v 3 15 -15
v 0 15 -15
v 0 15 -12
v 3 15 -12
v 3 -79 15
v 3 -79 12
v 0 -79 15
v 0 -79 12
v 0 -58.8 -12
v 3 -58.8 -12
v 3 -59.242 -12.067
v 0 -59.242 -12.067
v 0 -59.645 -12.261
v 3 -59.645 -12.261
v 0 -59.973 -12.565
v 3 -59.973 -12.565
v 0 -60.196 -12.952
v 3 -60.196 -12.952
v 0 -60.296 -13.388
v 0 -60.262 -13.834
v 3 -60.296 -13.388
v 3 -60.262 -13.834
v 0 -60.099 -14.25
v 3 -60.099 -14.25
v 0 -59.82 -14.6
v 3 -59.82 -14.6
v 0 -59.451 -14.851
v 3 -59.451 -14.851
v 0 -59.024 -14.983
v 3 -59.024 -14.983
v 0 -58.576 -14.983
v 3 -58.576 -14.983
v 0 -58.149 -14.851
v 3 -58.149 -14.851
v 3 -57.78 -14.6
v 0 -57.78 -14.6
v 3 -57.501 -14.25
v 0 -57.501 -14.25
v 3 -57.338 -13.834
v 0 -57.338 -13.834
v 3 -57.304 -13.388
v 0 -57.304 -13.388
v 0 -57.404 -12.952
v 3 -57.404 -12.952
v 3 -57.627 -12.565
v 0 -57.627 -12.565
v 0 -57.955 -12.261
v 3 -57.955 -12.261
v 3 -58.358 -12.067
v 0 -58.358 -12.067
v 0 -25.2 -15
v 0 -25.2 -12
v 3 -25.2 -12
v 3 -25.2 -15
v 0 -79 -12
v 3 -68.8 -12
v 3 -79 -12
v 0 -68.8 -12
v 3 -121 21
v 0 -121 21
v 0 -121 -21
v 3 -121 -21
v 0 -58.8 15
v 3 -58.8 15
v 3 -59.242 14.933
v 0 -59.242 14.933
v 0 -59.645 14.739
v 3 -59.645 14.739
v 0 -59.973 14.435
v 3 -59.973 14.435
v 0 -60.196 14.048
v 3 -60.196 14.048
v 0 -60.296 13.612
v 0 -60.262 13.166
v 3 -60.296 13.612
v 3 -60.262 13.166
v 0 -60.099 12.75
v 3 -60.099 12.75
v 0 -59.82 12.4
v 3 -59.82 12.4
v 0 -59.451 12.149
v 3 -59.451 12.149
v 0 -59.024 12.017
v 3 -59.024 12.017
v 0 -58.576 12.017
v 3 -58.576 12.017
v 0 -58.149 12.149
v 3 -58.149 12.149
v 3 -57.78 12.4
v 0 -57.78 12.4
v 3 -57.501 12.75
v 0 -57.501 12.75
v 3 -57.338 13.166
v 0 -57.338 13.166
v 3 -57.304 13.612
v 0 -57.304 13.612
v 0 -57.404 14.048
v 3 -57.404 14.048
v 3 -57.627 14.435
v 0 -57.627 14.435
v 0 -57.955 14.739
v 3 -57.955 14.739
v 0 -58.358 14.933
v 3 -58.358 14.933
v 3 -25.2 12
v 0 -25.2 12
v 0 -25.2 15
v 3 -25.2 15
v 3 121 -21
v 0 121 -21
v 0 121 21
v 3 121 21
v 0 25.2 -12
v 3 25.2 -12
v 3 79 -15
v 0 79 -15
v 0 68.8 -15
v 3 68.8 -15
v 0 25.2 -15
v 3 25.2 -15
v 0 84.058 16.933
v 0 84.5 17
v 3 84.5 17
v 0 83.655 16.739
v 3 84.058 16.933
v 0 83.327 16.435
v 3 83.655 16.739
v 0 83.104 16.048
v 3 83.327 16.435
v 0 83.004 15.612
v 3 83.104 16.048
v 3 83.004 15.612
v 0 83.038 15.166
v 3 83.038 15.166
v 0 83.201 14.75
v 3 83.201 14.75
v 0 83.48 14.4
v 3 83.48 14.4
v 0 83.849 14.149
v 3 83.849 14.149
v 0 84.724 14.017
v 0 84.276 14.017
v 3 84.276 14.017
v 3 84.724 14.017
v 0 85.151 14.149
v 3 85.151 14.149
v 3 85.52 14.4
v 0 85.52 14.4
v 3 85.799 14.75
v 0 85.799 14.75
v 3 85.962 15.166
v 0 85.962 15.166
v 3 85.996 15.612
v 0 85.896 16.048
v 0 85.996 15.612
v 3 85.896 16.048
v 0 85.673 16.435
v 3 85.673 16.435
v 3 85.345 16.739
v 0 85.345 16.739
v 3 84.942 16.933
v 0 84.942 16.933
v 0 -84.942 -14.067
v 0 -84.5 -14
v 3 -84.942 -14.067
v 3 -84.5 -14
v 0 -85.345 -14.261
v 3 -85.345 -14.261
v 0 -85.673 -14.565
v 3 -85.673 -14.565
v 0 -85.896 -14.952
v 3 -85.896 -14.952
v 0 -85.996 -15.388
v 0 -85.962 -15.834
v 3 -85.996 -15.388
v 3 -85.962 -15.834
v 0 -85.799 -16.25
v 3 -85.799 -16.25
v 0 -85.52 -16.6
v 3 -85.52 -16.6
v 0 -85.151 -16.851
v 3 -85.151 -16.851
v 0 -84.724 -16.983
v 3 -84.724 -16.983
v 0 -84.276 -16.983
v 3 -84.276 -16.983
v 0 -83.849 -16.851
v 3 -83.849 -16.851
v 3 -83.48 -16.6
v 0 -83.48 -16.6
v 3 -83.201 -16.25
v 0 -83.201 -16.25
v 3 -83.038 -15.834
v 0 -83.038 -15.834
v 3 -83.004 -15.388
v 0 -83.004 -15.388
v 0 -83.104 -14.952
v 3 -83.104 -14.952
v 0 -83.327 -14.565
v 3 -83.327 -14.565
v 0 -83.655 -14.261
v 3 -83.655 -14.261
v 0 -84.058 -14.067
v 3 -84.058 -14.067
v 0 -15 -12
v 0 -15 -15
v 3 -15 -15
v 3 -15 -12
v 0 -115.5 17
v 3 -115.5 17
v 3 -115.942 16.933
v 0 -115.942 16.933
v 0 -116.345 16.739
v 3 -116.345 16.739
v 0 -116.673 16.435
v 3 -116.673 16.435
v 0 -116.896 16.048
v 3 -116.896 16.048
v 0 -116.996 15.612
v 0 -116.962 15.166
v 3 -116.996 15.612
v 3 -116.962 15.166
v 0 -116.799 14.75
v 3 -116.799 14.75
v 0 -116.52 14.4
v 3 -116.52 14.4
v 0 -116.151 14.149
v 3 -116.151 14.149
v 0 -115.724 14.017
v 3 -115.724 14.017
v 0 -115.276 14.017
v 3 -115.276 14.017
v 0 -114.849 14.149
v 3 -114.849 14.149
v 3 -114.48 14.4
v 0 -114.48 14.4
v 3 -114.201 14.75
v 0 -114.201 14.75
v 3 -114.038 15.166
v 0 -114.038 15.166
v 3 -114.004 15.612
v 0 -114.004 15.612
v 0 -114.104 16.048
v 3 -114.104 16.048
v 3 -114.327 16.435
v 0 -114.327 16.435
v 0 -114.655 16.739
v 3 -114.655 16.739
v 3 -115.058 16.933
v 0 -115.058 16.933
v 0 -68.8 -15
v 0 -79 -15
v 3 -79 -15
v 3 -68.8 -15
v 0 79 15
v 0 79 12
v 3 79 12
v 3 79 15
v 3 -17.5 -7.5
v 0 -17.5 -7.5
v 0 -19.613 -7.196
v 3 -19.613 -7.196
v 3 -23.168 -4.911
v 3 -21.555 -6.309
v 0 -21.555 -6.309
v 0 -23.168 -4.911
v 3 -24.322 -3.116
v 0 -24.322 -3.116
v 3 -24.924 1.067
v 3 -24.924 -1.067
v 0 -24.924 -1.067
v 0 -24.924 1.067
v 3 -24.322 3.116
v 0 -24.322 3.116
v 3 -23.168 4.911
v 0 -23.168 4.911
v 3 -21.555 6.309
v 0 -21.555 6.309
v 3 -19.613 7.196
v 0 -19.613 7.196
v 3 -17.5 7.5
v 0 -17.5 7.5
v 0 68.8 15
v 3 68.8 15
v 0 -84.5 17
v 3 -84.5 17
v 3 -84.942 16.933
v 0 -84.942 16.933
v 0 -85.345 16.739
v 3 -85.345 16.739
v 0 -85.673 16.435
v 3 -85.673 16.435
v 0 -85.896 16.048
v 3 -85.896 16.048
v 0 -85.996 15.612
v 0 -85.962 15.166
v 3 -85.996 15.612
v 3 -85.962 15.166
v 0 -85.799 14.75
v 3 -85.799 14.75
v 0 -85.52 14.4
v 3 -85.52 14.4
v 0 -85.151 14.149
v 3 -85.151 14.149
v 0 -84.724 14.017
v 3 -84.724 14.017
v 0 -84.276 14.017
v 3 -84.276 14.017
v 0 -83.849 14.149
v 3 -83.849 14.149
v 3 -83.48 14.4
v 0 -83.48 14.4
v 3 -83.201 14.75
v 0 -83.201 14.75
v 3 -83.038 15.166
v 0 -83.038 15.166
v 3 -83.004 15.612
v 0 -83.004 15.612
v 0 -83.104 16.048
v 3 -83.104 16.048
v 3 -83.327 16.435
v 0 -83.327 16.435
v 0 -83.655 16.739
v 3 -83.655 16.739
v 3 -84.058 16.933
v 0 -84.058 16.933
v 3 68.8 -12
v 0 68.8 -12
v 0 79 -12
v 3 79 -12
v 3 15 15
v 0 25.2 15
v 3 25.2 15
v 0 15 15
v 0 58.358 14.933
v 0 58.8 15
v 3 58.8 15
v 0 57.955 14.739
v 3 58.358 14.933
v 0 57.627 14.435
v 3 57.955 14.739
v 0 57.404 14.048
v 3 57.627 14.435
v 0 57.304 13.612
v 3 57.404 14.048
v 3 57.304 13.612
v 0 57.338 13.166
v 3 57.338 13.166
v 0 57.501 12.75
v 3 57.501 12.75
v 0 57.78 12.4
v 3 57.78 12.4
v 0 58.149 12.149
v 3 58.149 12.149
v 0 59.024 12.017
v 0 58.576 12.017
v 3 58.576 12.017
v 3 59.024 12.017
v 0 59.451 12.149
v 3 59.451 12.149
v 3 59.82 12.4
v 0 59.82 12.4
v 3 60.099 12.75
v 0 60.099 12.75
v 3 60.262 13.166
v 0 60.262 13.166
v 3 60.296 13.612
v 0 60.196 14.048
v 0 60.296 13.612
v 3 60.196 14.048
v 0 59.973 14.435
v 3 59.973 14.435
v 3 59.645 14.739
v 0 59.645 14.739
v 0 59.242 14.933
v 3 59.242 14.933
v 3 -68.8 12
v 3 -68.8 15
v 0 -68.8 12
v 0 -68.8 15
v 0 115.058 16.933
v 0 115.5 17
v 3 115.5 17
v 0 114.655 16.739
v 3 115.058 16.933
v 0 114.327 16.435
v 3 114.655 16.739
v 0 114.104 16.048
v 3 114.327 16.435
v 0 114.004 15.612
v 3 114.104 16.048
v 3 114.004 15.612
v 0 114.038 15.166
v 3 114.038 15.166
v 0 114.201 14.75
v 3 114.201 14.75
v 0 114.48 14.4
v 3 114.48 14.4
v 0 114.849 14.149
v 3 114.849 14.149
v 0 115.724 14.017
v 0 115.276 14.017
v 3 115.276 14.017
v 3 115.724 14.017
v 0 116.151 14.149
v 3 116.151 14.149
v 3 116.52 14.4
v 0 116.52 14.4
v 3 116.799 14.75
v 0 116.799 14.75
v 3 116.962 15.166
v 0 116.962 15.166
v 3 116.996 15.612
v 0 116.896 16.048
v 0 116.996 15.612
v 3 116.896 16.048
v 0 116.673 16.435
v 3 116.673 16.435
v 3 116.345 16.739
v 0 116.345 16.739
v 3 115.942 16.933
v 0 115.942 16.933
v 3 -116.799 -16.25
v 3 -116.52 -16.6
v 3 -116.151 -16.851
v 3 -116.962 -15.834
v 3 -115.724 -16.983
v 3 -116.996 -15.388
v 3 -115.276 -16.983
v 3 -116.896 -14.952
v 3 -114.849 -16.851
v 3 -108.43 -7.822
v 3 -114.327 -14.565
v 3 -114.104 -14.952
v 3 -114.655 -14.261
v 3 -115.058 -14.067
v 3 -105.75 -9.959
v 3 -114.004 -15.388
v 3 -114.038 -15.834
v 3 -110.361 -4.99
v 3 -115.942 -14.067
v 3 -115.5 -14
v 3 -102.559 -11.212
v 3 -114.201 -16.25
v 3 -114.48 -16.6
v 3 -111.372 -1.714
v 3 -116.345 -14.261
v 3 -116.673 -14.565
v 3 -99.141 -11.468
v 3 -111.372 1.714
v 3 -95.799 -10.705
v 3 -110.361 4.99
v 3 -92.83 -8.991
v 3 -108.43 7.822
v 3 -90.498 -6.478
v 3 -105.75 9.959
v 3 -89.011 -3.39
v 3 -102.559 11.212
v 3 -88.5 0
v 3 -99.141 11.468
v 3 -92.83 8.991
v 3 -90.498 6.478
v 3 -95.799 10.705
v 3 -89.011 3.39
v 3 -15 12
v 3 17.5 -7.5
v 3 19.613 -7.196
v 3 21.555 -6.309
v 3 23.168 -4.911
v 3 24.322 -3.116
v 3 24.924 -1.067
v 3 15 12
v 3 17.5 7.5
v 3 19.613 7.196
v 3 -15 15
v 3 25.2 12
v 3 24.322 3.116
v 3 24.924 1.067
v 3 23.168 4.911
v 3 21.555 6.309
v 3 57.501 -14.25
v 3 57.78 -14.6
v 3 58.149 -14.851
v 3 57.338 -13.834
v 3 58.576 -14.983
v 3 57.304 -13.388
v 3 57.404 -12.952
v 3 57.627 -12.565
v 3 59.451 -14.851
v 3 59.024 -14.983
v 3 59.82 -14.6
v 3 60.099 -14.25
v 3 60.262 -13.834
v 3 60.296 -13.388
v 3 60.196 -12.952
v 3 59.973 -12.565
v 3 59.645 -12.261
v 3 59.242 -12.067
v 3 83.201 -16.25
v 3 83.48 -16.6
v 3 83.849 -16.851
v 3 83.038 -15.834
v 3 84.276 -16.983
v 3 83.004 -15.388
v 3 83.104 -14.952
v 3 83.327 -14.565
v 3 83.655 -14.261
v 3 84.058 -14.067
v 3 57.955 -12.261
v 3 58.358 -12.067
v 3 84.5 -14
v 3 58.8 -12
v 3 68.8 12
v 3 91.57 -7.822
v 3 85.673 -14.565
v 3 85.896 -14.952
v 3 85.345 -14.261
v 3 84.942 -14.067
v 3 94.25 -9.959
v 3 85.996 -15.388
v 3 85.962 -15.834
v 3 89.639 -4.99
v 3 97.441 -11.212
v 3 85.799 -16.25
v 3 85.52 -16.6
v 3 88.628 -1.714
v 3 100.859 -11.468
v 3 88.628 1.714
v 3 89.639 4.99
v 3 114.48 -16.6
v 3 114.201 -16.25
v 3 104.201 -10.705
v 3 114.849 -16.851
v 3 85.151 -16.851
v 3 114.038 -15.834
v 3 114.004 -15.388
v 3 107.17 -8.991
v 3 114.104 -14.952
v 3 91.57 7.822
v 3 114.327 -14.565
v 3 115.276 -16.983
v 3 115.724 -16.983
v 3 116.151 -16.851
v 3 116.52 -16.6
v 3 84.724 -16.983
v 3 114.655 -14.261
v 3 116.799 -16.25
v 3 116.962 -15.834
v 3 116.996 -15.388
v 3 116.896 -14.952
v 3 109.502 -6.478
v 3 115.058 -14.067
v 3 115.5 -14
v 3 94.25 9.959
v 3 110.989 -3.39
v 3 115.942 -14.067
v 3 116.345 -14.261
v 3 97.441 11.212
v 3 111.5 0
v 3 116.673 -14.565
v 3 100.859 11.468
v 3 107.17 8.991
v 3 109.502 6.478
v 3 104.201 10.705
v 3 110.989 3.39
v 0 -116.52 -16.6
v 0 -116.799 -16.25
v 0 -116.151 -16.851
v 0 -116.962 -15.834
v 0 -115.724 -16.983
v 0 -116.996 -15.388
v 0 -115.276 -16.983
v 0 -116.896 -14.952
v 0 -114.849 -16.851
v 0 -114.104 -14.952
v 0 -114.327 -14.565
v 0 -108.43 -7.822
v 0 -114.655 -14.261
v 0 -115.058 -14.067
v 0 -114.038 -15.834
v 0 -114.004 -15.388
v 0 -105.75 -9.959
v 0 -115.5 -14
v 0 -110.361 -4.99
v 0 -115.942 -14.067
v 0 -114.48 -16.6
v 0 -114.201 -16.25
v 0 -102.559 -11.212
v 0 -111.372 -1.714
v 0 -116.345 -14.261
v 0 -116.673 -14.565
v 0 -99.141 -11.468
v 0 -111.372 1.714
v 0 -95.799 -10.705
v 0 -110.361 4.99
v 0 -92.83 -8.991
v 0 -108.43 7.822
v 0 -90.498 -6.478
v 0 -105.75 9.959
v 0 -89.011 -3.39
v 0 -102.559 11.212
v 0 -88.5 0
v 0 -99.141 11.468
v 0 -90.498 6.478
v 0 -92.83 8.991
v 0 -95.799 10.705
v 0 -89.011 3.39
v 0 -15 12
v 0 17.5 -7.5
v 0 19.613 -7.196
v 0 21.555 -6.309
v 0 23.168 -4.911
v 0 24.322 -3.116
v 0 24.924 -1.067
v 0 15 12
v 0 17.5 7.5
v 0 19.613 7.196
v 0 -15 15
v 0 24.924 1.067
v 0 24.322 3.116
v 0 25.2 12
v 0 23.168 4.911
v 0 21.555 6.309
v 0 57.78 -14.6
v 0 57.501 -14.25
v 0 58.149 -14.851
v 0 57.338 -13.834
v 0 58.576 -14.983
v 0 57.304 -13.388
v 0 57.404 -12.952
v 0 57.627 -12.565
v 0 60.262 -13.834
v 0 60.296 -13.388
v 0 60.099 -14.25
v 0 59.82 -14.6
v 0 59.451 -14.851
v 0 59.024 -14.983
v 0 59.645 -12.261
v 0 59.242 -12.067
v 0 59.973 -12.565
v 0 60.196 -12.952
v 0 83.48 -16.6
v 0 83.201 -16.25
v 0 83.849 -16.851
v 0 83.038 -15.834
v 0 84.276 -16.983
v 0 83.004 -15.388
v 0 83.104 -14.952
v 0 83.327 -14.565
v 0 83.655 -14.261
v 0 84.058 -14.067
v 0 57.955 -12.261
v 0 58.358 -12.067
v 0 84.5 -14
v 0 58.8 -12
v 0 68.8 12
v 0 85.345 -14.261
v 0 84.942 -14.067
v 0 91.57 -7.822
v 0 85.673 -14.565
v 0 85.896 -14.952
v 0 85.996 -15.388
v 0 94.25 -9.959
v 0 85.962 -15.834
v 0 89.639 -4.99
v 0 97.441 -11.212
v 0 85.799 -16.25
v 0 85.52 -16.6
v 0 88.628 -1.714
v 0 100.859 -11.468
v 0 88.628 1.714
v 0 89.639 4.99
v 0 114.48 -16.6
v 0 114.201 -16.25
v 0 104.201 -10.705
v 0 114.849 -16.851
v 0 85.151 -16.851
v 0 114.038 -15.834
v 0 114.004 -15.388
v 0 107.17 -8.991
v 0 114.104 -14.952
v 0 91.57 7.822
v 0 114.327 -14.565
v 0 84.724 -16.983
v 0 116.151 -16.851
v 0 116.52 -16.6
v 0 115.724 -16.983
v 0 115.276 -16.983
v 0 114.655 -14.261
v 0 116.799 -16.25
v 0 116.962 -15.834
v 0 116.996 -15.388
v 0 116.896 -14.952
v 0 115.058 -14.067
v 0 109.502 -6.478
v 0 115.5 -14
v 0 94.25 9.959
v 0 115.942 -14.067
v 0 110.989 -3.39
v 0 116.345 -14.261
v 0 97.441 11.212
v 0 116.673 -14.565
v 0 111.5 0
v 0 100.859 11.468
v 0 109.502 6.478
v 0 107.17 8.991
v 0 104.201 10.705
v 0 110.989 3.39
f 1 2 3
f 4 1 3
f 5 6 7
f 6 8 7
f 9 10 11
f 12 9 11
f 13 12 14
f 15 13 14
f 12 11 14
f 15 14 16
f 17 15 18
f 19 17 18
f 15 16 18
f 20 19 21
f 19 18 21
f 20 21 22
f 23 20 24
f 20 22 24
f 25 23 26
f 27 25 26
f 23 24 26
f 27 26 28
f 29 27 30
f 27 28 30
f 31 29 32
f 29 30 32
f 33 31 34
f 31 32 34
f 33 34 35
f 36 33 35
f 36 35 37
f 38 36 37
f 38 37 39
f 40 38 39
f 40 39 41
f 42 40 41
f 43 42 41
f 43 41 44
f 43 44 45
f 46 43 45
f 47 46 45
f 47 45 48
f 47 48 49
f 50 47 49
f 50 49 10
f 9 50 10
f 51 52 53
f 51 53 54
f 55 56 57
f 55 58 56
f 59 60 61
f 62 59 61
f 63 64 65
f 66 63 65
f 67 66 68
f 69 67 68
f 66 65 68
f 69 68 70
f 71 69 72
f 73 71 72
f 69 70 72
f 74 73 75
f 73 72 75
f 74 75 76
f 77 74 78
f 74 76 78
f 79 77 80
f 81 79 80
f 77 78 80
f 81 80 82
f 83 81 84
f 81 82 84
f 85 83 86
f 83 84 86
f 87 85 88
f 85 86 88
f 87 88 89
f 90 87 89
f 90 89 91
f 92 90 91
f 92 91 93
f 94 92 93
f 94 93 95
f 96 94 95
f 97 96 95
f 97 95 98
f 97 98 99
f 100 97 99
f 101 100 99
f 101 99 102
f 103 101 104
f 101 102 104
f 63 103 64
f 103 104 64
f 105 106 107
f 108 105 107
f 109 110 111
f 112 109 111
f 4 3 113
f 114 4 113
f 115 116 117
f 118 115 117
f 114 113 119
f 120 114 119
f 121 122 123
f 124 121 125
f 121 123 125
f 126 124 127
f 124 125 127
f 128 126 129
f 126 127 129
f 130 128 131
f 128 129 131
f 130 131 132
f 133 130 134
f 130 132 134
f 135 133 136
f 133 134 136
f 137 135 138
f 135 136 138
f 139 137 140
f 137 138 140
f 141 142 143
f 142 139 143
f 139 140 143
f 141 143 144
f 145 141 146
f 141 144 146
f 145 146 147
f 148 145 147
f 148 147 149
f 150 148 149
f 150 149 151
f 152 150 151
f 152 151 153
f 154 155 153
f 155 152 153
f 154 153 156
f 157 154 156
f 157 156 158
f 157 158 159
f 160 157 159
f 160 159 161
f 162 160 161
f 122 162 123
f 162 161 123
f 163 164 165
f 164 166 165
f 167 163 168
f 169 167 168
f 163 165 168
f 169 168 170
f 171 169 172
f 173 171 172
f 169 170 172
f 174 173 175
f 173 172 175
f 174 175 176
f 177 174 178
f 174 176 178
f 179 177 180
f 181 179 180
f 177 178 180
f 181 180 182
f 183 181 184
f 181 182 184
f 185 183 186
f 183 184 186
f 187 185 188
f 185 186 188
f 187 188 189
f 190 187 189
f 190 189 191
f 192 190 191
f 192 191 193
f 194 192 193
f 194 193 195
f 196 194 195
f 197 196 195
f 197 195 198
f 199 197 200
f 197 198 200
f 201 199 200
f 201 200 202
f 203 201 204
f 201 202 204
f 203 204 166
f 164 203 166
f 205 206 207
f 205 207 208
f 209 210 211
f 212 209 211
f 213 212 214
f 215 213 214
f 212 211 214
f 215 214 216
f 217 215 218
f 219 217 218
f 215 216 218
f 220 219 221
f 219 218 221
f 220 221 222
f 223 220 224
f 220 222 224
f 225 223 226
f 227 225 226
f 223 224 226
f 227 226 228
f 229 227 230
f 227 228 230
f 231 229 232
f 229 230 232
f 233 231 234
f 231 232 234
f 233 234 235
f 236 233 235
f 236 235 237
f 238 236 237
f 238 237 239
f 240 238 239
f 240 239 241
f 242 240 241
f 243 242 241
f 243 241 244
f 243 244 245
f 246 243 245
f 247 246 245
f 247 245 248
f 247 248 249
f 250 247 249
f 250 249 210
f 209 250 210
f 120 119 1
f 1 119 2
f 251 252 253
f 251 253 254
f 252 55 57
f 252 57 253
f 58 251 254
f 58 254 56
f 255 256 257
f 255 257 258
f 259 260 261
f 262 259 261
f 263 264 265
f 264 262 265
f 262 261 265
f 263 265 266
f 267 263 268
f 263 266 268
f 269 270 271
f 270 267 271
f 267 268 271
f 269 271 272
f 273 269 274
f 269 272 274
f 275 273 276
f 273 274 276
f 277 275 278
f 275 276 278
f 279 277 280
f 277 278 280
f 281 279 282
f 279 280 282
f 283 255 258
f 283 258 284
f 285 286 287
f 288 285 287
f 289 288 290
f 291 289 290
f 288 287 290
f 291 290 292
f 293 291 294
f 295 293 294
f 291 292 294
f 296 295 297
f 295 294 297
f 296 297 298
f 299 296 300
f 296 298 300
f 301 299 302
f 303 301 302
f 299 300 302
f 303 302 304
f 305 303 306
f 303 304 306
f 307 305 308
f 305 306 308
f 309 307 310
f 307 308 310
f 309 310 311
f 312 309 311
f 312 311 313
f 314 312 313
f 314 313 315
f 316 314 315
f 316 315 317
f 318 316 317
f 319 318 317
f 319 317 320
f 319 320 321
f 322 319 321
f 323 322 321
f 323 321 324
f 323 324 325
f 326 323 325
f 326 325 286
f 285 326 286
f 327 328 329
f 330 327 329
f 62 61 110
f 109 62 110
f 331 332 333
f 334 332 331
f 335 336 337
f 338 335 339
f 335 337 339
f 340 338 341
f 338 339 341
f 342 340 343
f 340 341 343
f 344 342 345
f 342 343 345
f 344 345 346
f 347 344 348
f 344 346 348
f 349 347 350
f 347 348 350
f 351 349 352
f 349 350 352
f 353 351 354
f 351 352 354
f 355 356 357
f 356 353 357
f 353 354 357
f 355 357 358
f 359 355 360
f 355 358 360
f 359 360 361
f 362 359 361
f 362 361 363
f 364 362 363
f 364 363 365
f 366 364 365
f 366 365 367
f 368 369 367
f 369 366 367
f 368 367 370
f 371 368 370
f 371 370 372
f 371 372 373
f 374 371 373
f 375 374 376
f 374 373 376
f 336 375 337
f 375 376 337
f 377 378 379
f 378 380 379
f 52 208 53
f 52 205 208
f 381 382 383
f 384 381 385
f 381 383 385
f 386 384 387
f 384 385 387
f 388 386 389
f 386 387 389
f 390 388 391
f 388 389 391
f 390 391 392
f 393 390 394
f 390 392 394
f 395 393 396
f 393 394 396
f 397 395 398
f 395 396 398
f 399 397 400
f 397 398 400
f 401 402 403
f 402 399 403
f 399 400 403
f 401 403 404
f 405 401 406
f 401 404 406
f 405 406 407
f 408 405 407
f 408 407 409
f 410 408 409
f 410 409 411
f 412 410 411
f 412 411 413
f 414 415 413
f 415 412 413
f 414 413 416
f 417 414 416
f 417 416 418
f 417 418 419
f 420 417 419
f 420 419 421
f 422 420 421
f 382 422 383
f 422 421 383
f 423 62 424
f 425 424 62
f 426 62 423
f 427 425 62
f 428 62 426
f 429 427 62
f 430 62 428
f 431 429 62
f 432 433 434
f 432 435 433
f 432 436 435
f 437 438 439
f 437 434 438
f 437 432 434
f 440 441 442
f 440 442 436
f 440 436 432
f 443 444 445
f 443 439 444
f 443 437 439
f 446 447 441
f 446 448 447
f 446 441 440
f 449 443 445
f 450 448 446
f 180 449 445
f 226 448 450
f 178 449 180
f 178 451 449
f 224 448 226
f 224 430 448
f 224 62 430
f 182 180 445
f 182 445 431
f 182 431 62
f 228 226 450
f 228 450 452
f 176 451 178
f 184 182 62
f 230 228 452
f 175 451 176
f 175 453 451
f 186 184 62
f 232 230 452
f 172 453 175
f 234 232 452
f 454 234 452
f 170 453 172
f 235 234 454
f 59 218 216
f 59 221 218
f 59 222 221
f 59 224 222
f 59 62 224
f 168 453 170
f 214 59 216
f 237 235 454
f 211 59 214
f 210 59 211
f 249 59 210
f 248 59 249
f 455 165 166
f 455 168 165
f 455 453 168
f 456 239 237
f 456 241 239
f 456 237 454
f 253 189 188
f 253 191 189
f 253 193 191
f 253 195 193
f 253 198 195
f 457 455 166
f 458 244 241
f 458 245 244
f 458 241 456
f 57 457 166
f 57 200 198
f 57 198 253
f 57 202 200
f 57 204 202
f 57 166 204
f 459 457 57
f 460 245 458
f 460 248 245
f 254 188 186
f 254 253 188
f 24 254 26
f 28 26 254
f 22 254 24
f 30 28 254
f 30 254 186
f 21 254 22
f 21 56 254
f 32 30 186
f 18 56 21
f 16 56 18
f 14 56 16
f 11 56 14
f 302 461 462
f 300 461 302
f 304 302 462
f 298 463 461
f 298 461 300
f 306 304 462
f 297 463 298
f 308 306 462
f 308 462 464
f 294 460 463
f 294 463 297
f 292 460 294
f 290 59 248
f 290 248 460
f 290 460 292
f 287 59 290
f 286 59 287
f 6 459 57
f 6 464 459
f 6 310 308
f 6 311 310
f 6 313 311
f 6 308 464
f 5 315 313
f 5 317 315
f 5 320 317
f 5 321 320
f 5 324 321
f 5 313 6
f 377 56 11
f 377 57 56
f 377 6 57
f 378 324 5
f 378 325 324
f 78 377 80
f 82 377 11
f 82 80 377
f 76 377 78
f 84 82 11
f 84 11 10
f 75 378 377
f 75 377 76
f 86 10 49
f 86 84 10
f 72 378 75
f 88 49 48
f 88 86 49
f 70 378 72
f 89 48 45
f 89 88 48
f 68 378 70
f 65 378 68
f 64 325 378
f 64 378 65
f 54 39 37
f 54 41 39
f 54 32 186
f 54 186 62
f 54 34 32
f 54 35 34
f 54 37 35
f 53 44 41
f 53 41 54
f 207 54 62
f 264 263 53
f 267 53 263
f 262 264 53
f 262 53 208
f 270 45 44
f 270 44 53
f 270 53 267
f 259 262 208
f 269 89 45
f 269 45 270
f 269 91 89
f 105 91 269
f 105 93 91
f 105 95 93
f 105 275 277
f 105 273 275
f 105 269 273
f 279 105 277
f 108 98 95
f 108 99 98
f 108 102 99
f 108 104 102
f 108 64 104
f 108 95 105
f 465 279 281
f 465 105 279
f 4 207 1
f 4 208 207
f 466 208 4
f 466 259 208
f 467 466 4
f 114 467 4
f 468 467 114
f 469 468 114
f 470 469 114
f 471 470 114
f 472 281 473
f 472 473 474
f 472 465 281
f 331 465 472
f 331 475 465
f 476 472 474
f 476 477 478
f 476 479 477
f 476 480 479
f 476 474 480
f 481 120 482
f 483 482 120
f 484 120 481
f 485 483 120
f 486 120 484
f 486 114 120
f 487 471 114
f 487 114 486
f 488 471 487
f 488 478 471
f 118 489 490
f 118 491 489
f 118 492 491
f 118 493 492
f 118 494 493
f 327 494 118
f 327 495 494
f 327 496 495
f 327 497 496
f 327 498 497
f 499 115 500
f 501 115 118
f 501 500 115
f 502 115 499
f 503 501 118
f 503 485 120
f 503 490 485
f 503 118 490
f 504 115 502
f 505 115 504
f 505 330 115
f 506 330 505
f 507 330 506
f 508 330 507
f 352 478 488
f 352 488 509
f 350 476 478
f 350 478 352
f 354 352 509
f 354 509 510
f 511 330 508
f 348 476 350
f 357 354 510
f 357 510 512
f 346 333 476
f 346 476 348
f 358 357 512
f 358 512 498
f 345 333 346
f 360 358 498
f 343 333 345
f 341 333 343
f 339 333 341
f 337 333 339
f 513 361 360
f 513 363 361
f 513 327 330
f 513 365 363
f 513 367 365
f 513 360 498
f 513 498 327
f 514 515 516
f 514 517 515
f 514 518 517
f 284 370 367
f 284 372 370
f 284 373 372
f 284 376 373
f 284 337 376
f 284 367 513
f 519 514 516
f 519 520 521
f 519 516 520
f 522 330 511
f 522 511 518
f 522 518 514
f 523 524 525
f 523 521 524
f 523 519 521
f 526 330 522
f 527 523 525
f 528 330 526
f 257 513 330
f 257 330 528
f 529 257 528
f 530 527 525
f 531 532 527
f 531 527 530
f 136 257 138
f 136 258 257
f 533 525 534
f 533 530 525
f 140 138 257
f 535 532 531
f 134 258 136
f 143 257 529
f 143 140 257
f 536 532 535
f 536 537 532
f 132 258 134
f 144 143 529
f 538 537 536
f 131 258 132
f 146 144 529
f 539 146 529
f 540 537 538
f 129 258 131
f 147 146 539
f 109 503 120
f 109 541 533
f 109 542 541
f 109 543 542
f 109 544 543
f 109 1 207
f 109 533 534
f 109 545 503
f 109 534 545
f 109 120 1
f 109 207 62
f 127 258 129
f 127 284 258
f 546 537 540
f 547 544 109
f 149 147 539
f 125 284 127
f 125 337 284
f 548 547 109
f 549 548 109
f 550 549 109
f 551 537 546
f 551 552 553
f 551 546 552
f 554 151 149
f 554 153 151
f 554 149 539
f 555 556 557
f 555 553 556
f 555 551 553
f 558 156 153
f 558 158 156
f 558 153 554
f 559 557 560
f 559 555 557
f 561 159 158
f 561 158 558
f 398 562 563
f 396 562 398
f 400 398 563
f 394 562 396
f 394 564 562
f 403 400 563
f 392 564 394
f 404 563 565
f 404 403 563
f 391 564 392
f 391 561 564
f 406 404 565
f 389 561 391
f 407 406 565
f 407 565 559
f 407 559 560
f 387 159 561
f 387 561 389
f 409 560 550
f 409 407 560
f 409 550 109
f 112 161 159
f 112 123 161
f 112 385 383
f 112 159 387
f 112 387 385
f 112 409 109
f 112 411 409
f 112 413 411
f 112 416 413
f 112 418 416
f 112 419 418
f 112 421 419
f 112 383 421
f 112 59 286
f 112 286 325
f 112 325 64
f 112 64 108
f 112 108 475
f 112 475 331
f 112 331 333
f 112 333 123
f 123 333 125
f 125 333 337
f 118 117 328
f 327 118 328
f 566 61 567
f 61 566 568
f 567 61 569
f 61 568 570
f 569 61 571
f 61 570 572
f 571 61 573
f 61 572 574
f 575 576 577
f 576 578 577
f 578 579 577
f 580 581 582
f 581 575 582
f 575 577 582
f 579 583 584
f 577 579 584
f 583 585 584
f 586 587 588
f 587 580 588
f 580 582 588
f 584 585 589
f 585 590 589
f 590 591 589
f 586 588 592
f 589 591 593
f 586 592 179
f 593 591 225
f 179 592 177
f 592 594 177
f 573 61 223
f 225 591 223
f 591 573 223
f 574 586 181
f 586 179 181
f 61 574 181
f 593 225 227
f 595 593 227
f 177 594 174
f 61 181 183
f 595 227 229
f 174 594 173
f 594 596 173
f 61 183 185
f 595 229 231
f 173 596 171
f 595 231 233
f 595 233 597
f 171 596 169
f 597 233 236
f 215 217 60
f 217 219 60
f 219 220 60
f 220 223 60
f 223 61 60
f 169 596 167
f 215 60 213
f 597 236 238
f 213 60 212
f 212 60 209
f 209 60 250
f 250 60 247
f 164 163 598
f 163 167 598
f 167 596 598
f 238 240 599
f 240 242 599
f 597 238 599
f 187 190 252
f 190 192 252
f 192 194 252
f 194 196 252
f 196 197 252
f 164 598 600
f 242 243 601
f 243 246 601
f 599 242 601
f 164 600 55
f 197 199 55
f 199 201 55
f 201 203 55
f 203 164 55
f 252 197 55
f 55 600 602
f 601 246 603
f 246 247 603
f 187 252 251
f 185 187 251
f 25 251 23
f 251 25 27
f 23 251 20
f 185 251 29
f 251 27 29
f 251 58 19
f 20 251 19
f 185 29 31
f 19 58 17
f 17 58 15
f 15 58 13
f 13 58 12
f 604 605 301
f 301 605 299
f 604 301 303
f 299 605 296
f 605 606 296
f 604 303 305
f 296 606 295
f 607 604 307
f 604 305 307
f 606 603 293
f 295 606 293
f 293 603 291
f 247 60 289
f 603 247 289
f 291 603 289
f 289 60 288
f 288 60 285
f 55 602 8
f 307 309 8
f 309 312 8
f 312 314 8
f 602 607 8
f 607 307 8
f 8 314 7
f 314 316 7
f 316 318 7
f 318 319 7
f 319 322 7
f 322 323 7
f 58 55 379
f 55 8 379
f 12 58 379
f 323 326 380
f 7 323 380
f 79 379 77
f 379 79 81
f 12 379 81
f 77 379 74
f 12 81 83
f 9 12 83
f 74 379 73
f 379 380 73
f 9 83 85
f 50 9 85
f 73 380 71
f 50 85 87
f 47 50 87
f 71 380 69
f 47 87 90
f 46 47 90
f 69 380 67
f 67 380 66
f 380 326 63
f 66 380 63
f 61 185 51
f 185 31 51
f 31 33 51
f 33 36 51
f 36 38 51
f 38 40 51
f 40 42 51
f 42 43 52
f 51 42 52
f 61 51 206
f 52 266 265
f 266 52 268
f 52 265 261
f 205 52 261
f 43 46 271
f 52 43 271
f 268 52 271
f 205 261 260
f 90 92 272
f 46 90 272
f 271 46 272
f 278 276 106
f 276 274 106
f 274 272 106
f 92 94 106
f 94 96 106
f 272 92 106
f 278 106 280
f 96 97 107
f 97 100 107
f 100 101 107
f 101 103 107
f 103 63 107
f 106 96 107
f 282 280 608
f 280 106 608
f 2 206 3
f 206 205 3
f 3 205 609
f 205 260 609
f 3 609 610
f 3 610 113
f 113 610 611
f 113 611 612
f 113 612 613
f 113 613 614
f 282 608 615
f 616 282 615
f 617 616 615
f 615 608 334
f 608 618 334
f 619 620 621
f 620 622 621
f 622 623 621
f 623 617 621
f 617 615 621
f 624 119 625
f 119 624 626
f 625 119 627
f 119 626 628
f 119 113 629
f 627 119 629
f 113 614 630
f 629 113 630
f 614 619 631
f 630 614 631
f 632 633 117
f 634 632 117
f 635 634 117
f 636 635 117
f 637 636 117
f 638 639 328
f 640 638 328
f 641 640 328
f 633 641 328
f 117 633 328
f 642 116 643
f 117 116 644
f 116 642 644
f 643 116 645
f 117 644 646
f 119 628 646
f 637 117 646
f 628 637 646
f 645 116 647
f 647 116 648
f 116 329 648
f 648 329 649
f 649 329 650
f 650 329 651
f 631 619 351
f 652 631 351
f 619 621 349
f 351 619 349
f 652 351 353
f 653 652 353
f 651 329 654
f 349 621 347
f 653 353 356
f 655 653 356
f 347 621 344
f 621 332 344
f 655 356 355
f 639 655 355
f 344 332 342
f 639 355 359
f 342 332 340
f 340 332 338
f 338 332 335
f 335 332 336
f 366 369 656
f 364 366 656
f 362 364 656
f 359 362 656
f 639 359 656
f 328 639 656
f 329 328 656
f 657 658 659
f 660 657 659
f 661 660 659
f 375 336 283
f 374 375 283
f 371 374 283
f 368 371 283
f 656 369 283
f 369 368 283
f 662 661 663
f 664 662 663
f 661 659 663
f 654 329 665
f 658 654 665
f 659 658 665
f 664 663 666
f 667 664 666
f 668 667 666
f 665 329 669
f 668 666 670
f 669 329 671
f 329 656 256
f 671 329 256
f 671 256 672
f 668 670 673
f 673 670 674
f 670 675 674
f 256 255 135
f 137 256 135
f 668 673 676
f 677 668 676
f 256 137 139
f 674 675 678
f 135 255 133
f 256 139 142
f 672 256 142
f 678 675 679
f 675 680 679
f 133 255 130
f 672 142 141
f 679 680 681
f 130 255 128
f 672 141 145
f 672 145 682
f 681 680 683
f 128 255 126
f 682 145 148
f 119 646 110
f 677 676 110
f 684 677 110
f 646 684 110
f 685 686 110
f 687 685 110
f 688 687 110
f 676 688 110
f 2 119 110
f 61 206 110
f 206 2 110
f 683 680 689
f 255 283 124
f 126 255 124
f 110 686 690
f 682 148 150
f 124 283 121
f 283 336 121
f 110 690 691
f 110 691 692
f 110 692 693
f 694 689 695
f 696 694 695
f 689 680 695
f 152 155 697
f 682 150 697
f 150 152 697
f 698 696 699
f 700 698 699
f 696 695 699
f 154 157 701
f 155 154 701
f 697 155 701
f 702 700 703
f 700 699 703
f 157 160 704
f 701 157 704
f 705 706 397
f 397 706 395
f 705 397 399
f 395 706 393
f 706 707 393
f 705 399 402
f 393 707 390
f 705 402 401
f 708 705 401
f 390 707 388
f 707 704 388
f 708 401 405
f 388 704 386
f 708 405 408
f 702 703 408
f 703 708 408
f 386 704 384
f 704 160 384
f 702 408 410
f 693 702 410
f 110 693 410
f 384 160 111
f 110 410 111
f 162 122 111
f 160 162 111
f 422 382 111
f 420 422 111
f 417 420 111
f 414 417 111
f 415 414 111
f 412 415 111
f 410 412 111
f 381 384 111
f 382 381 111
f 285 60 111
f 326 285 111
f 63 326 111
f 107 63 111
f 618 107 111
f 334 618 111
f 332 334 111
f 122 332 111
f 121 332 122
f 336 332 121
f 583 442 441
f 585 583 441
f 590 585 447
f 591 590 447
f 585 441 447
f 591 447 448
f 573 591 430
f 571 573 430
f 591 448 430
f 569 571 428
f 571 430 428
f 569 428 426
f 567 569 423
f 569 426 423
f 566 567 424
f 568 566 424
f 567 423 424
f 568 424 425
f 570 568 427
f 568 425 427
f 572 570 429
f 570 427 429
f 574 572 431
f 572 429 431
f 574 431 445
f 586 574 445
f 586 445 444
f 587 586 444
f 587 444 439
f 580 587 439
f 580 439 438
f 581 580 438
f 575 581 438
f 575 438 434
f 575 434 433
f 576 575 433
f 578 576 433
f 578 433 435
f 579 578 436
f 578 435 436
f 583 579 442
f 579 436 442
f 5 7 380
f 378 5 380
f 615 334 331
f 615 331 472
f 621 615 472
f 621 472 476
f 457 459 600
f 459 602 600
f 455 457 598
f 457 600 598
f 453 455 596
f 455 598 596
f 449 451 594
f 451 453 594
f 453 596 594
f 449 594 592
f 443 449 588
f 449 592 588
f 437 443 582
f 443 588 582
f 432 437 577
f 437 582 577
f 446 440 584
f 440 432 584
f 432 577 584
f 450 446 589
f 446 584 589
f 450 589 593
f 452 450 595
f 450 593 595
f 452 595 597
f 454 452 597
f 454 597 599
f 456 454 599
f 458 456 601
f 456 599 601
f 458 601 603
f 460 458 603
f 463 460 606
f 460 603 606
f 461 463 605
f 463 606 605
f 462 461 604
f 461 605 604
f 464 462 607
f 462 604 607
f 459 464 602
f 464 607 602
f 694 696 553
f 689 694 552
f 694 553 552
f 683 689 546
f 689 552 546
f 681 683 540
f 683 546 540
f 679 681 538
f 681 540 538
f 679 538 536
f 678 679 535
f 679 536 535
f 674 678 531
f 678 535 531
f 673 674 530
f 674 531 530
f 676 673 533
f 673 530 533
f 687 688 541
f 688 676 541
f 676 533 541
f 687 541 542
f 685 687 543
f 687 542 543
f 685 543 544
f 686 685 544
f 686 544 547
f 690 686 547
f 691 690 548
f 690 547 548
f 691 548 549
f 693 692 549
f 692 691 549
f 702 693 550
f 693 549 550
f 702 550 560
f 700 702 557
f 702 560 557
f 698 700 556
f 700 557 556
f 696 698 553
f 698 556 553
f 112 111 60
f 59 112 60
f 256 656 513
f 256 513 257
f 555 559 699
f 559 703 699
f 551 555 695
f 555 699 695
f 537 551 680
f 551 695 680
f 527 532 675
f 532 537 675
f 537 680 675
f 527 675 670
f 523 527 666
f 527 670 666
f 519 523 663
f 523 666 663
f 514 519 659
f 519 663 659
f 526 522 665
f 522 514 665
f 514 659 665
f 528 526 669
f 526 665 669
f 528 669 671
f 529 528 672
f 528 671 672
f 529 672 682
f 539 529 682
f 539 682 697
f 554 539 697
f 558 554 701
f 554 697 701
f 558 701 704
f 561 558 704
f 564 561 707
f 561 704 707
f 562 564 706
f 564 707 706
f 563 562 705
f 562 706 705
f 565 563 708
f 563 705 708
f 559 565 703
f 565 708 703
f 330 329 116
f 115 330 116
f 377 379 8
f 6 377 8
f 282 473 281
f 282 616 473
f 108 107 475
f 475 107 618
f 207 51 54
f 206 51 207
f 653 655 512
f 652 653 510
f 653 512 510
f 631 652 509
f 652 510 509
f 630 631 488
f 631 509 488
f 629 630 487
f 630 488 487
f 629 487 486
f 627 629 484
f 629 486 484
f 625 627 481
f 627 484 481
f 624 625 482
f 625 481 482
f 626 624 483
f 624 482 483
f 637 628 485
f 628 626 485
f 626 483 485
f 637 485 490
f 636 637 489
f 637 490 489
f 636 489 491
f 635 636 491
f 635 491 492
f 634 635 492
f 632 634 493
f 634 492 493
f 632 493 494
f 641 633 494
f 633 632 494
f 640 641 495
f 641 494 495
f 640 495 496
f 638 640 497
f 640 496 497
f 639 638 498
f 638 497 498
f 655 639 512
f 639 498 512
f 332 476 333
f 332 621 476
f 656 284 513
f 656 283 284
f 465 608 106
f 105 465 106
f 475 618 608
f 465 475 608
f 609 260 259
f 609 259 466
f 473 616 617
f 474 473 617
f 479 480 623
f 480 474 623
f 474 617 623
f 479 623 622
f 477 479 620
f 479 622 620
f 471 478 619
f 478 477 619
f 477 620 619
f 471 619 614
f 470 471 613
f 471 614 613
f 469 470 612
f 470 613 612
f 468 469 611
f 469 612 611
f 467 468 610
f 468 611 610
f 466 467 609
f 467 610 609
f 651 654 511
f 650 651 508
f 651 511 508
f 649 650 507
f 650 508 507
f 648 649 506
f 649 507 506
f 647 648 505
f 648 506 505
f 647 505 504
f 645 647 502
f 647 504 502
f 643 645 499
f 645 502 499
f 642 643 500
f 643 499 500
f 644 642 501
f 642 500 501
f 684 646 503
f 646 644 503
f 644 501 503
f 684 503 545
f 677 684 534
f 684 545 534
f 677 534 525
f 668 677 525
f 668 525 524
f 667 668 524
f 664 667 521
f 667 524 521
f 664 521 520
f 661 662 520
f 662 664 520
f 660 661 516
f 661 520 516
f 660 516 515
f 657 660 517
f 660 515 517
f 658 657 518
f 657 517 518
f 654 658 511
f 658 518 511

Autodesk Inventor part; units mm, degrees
ref_plane "YZ Plane" through (0, 0, 0) normal (1, 0, 0) x (0, 1, 0)
ref_plane "XZ Plane" through (0, 0, 0) normal (0, 1, 0) x (-1, 0, 0)
ref_plane "XY Plane" through (0, 0, 0) normal (0, 0, 1) x (1, 0, 0)
sketch "Esboço1" plane through (0, 0, 0) normal (1, 0, 0) x (0, 1, 0)
  line L0 (-121, -21) -> (121, -21)
  line L1 (121, -21) -> (121, 21)
  line L2 (121, 21) -> (-121, 21)
  line L3 (-121, 21) -> (-121, -21)
  line L4 (-121, -21) -> (121, 21) construction
  line L5 (121, -21) -> (-121, 21) construction
  line L6 (-121, 21) -> (-79, 21) construction
  line L7 (-79, 21) -> (-79, -21) construction
  line L8 (-79, -21) -> (-121, -21) construction
  line L9 (-121, -21) -> (-121, 21) construction
  line L10 (-115.5, -15.5) -> (-84.5, -15.5) construction
  line L11 (-84.5, -15.5) -> (-84.5, 15.5) construction
  line L12 (-84.5, 15.5) -> (-115.5, 15.5) construction
  line L13 (-115.5, 15.5) -> (-115.5, -15.5) construction
  line L14 (-115.5, -15.5) -> (-84.5, 15.5) construction
  line L15 (-84.5, -15.5) -> (-115.5, 15.5) construction
  circle A0 centre (-100, 0) radius 11.5
  line L16 (-25, 0) -> (25, 0) construction
  line L17 (-17.5, -7.5) -> (17.5, -7.5)
  line L18 (17.5, 7.5) -> (-17.5, 7.5)
  arc A1 (-17.5, 7.5) -> (-17.5, -7.5) centre (-17.5, 0) ccw
  arc A2 (17.5, -7.5) -> (17.5, 7.5) centre (17.5, 0) ccw
  line L19 (-79, 15) -> (-68.8, 15)
  line L20 (-68.8, 15) -> (-68.8, 12)
  line L21 (-68.8, 12) -> (-79, 12)
  line L22 (-79, 12) -> (-79, 15)
  line L23 (-25.2, 15) -> (-15, 15)
  line L24 (-15, 15) -> (-15, 12)
  line L25 (-15, 12) -> (-25.2, 12)
  line L26 (-25.2, 12) -> (-25.2, 15)
  circle A3 centre (-58.8, 13.5) radius 5 construction
  line L27 (-121, 0) -> (121, 0) construction
  line L28 (-79, -15) -> (-68.8, -15)
  line L29 (-68.8, -15) -> (-68.8, -12)
  line L30 (-68.8, -12) -> (-79, -12)
  line L31 (-79, -12) -> (-79, -15)
  line L32 (-25.2, -15) -> (-15, -15)
  line L33 (-15, -15) -> (-15, -12)
  line L34 (-15, -12) -> (-25.2, -12)
  line L35 (-25.2, -12) -> (-25.2, -15)
  circle A4 centre (-58.8, -13.5) radius 5 construction
  line L36 (0, -21) -> (0, 21) construction
  circle A5 centre (100, 0) radius 11.5
  line L37 (79, 15) -> (68.8, 15)
  line L38 (68.8, 15) -> (68.8, 12)
  line L39 (68.8, 12) -> (79, 12)
  line L40 (79, 12) -> (79, 15)
  line L41 (25.2, 15) -> (15, 15)
  line L42 (15, 15) -> (15, 12)
  line L43 (15, 12) -> (25.2, 12)
  line L44 (25.2, 12) -> (25.2, 15)
  line L45 (68.8, -15) -> (68.8, -12)
  line L46 (79, -15) -> (68.8, -15)
  line L47 (79, -12) -> (79, -15)
  line L48 (68.8, -12) -> (79, -12)
  line L49 (25.2, -12) -> (25.2, -15)
  line L50 (25.2, -15) -> (15, -15)
  line L51 (15, -12) -> (25.2, -12)
  line L52 (15, -15) -> (15, -12)
  point P0 (0, 0)
  point P1 (-100, 0)
  point P2 (-100, 21)
  point P3 (0, 0)
  point P4 (0, 0)
  point P5 (-68.8, 13.5)
  point P6 (-68.8, -13.5)
  point P7 (68.8, 13.5)
  point P8 (68.8, -13.5)
  dimension "d0" = 242
  dimension "d1" = 42
  dimension "d2" = 42
  dimension "d3" = 42
  dimension "d4" = 31
  dimension "d5" = 31
  dimension "d6" = 23
  dimension "d7" = 15
  dimension "d8" = 35
  dimension "d9" = 10.2
  dimension "d10" = 3
  dimension "d12" = 6
  dimension "d13" = 10.2
  dimension "d14" = 3
  dimension "d15" = 15
  dimension "d16" = 10
  dimension "d17" = 10
extrude "Extrusão1" add sketch "Esboço1" along normal blind 3
hole "Furo1" at (0, -58.8, 13.5) at (0, -58.8, -13.5) at (0, -84.5, 15.5) at (0, -115.5, 15.5) at (0, -115.5, -15.5) at (0, -84.5, -15.5) direction (1, 0, 0) diameter 3 end through all
mirror "Espelhamento1" about plane through (0, 0, 0) normal (0, 1, 0) of "Furo1"
equation "\"d13\" = d9"
equation "\"d14\" = d10"
properties part number "Lateral_Acrilico"
